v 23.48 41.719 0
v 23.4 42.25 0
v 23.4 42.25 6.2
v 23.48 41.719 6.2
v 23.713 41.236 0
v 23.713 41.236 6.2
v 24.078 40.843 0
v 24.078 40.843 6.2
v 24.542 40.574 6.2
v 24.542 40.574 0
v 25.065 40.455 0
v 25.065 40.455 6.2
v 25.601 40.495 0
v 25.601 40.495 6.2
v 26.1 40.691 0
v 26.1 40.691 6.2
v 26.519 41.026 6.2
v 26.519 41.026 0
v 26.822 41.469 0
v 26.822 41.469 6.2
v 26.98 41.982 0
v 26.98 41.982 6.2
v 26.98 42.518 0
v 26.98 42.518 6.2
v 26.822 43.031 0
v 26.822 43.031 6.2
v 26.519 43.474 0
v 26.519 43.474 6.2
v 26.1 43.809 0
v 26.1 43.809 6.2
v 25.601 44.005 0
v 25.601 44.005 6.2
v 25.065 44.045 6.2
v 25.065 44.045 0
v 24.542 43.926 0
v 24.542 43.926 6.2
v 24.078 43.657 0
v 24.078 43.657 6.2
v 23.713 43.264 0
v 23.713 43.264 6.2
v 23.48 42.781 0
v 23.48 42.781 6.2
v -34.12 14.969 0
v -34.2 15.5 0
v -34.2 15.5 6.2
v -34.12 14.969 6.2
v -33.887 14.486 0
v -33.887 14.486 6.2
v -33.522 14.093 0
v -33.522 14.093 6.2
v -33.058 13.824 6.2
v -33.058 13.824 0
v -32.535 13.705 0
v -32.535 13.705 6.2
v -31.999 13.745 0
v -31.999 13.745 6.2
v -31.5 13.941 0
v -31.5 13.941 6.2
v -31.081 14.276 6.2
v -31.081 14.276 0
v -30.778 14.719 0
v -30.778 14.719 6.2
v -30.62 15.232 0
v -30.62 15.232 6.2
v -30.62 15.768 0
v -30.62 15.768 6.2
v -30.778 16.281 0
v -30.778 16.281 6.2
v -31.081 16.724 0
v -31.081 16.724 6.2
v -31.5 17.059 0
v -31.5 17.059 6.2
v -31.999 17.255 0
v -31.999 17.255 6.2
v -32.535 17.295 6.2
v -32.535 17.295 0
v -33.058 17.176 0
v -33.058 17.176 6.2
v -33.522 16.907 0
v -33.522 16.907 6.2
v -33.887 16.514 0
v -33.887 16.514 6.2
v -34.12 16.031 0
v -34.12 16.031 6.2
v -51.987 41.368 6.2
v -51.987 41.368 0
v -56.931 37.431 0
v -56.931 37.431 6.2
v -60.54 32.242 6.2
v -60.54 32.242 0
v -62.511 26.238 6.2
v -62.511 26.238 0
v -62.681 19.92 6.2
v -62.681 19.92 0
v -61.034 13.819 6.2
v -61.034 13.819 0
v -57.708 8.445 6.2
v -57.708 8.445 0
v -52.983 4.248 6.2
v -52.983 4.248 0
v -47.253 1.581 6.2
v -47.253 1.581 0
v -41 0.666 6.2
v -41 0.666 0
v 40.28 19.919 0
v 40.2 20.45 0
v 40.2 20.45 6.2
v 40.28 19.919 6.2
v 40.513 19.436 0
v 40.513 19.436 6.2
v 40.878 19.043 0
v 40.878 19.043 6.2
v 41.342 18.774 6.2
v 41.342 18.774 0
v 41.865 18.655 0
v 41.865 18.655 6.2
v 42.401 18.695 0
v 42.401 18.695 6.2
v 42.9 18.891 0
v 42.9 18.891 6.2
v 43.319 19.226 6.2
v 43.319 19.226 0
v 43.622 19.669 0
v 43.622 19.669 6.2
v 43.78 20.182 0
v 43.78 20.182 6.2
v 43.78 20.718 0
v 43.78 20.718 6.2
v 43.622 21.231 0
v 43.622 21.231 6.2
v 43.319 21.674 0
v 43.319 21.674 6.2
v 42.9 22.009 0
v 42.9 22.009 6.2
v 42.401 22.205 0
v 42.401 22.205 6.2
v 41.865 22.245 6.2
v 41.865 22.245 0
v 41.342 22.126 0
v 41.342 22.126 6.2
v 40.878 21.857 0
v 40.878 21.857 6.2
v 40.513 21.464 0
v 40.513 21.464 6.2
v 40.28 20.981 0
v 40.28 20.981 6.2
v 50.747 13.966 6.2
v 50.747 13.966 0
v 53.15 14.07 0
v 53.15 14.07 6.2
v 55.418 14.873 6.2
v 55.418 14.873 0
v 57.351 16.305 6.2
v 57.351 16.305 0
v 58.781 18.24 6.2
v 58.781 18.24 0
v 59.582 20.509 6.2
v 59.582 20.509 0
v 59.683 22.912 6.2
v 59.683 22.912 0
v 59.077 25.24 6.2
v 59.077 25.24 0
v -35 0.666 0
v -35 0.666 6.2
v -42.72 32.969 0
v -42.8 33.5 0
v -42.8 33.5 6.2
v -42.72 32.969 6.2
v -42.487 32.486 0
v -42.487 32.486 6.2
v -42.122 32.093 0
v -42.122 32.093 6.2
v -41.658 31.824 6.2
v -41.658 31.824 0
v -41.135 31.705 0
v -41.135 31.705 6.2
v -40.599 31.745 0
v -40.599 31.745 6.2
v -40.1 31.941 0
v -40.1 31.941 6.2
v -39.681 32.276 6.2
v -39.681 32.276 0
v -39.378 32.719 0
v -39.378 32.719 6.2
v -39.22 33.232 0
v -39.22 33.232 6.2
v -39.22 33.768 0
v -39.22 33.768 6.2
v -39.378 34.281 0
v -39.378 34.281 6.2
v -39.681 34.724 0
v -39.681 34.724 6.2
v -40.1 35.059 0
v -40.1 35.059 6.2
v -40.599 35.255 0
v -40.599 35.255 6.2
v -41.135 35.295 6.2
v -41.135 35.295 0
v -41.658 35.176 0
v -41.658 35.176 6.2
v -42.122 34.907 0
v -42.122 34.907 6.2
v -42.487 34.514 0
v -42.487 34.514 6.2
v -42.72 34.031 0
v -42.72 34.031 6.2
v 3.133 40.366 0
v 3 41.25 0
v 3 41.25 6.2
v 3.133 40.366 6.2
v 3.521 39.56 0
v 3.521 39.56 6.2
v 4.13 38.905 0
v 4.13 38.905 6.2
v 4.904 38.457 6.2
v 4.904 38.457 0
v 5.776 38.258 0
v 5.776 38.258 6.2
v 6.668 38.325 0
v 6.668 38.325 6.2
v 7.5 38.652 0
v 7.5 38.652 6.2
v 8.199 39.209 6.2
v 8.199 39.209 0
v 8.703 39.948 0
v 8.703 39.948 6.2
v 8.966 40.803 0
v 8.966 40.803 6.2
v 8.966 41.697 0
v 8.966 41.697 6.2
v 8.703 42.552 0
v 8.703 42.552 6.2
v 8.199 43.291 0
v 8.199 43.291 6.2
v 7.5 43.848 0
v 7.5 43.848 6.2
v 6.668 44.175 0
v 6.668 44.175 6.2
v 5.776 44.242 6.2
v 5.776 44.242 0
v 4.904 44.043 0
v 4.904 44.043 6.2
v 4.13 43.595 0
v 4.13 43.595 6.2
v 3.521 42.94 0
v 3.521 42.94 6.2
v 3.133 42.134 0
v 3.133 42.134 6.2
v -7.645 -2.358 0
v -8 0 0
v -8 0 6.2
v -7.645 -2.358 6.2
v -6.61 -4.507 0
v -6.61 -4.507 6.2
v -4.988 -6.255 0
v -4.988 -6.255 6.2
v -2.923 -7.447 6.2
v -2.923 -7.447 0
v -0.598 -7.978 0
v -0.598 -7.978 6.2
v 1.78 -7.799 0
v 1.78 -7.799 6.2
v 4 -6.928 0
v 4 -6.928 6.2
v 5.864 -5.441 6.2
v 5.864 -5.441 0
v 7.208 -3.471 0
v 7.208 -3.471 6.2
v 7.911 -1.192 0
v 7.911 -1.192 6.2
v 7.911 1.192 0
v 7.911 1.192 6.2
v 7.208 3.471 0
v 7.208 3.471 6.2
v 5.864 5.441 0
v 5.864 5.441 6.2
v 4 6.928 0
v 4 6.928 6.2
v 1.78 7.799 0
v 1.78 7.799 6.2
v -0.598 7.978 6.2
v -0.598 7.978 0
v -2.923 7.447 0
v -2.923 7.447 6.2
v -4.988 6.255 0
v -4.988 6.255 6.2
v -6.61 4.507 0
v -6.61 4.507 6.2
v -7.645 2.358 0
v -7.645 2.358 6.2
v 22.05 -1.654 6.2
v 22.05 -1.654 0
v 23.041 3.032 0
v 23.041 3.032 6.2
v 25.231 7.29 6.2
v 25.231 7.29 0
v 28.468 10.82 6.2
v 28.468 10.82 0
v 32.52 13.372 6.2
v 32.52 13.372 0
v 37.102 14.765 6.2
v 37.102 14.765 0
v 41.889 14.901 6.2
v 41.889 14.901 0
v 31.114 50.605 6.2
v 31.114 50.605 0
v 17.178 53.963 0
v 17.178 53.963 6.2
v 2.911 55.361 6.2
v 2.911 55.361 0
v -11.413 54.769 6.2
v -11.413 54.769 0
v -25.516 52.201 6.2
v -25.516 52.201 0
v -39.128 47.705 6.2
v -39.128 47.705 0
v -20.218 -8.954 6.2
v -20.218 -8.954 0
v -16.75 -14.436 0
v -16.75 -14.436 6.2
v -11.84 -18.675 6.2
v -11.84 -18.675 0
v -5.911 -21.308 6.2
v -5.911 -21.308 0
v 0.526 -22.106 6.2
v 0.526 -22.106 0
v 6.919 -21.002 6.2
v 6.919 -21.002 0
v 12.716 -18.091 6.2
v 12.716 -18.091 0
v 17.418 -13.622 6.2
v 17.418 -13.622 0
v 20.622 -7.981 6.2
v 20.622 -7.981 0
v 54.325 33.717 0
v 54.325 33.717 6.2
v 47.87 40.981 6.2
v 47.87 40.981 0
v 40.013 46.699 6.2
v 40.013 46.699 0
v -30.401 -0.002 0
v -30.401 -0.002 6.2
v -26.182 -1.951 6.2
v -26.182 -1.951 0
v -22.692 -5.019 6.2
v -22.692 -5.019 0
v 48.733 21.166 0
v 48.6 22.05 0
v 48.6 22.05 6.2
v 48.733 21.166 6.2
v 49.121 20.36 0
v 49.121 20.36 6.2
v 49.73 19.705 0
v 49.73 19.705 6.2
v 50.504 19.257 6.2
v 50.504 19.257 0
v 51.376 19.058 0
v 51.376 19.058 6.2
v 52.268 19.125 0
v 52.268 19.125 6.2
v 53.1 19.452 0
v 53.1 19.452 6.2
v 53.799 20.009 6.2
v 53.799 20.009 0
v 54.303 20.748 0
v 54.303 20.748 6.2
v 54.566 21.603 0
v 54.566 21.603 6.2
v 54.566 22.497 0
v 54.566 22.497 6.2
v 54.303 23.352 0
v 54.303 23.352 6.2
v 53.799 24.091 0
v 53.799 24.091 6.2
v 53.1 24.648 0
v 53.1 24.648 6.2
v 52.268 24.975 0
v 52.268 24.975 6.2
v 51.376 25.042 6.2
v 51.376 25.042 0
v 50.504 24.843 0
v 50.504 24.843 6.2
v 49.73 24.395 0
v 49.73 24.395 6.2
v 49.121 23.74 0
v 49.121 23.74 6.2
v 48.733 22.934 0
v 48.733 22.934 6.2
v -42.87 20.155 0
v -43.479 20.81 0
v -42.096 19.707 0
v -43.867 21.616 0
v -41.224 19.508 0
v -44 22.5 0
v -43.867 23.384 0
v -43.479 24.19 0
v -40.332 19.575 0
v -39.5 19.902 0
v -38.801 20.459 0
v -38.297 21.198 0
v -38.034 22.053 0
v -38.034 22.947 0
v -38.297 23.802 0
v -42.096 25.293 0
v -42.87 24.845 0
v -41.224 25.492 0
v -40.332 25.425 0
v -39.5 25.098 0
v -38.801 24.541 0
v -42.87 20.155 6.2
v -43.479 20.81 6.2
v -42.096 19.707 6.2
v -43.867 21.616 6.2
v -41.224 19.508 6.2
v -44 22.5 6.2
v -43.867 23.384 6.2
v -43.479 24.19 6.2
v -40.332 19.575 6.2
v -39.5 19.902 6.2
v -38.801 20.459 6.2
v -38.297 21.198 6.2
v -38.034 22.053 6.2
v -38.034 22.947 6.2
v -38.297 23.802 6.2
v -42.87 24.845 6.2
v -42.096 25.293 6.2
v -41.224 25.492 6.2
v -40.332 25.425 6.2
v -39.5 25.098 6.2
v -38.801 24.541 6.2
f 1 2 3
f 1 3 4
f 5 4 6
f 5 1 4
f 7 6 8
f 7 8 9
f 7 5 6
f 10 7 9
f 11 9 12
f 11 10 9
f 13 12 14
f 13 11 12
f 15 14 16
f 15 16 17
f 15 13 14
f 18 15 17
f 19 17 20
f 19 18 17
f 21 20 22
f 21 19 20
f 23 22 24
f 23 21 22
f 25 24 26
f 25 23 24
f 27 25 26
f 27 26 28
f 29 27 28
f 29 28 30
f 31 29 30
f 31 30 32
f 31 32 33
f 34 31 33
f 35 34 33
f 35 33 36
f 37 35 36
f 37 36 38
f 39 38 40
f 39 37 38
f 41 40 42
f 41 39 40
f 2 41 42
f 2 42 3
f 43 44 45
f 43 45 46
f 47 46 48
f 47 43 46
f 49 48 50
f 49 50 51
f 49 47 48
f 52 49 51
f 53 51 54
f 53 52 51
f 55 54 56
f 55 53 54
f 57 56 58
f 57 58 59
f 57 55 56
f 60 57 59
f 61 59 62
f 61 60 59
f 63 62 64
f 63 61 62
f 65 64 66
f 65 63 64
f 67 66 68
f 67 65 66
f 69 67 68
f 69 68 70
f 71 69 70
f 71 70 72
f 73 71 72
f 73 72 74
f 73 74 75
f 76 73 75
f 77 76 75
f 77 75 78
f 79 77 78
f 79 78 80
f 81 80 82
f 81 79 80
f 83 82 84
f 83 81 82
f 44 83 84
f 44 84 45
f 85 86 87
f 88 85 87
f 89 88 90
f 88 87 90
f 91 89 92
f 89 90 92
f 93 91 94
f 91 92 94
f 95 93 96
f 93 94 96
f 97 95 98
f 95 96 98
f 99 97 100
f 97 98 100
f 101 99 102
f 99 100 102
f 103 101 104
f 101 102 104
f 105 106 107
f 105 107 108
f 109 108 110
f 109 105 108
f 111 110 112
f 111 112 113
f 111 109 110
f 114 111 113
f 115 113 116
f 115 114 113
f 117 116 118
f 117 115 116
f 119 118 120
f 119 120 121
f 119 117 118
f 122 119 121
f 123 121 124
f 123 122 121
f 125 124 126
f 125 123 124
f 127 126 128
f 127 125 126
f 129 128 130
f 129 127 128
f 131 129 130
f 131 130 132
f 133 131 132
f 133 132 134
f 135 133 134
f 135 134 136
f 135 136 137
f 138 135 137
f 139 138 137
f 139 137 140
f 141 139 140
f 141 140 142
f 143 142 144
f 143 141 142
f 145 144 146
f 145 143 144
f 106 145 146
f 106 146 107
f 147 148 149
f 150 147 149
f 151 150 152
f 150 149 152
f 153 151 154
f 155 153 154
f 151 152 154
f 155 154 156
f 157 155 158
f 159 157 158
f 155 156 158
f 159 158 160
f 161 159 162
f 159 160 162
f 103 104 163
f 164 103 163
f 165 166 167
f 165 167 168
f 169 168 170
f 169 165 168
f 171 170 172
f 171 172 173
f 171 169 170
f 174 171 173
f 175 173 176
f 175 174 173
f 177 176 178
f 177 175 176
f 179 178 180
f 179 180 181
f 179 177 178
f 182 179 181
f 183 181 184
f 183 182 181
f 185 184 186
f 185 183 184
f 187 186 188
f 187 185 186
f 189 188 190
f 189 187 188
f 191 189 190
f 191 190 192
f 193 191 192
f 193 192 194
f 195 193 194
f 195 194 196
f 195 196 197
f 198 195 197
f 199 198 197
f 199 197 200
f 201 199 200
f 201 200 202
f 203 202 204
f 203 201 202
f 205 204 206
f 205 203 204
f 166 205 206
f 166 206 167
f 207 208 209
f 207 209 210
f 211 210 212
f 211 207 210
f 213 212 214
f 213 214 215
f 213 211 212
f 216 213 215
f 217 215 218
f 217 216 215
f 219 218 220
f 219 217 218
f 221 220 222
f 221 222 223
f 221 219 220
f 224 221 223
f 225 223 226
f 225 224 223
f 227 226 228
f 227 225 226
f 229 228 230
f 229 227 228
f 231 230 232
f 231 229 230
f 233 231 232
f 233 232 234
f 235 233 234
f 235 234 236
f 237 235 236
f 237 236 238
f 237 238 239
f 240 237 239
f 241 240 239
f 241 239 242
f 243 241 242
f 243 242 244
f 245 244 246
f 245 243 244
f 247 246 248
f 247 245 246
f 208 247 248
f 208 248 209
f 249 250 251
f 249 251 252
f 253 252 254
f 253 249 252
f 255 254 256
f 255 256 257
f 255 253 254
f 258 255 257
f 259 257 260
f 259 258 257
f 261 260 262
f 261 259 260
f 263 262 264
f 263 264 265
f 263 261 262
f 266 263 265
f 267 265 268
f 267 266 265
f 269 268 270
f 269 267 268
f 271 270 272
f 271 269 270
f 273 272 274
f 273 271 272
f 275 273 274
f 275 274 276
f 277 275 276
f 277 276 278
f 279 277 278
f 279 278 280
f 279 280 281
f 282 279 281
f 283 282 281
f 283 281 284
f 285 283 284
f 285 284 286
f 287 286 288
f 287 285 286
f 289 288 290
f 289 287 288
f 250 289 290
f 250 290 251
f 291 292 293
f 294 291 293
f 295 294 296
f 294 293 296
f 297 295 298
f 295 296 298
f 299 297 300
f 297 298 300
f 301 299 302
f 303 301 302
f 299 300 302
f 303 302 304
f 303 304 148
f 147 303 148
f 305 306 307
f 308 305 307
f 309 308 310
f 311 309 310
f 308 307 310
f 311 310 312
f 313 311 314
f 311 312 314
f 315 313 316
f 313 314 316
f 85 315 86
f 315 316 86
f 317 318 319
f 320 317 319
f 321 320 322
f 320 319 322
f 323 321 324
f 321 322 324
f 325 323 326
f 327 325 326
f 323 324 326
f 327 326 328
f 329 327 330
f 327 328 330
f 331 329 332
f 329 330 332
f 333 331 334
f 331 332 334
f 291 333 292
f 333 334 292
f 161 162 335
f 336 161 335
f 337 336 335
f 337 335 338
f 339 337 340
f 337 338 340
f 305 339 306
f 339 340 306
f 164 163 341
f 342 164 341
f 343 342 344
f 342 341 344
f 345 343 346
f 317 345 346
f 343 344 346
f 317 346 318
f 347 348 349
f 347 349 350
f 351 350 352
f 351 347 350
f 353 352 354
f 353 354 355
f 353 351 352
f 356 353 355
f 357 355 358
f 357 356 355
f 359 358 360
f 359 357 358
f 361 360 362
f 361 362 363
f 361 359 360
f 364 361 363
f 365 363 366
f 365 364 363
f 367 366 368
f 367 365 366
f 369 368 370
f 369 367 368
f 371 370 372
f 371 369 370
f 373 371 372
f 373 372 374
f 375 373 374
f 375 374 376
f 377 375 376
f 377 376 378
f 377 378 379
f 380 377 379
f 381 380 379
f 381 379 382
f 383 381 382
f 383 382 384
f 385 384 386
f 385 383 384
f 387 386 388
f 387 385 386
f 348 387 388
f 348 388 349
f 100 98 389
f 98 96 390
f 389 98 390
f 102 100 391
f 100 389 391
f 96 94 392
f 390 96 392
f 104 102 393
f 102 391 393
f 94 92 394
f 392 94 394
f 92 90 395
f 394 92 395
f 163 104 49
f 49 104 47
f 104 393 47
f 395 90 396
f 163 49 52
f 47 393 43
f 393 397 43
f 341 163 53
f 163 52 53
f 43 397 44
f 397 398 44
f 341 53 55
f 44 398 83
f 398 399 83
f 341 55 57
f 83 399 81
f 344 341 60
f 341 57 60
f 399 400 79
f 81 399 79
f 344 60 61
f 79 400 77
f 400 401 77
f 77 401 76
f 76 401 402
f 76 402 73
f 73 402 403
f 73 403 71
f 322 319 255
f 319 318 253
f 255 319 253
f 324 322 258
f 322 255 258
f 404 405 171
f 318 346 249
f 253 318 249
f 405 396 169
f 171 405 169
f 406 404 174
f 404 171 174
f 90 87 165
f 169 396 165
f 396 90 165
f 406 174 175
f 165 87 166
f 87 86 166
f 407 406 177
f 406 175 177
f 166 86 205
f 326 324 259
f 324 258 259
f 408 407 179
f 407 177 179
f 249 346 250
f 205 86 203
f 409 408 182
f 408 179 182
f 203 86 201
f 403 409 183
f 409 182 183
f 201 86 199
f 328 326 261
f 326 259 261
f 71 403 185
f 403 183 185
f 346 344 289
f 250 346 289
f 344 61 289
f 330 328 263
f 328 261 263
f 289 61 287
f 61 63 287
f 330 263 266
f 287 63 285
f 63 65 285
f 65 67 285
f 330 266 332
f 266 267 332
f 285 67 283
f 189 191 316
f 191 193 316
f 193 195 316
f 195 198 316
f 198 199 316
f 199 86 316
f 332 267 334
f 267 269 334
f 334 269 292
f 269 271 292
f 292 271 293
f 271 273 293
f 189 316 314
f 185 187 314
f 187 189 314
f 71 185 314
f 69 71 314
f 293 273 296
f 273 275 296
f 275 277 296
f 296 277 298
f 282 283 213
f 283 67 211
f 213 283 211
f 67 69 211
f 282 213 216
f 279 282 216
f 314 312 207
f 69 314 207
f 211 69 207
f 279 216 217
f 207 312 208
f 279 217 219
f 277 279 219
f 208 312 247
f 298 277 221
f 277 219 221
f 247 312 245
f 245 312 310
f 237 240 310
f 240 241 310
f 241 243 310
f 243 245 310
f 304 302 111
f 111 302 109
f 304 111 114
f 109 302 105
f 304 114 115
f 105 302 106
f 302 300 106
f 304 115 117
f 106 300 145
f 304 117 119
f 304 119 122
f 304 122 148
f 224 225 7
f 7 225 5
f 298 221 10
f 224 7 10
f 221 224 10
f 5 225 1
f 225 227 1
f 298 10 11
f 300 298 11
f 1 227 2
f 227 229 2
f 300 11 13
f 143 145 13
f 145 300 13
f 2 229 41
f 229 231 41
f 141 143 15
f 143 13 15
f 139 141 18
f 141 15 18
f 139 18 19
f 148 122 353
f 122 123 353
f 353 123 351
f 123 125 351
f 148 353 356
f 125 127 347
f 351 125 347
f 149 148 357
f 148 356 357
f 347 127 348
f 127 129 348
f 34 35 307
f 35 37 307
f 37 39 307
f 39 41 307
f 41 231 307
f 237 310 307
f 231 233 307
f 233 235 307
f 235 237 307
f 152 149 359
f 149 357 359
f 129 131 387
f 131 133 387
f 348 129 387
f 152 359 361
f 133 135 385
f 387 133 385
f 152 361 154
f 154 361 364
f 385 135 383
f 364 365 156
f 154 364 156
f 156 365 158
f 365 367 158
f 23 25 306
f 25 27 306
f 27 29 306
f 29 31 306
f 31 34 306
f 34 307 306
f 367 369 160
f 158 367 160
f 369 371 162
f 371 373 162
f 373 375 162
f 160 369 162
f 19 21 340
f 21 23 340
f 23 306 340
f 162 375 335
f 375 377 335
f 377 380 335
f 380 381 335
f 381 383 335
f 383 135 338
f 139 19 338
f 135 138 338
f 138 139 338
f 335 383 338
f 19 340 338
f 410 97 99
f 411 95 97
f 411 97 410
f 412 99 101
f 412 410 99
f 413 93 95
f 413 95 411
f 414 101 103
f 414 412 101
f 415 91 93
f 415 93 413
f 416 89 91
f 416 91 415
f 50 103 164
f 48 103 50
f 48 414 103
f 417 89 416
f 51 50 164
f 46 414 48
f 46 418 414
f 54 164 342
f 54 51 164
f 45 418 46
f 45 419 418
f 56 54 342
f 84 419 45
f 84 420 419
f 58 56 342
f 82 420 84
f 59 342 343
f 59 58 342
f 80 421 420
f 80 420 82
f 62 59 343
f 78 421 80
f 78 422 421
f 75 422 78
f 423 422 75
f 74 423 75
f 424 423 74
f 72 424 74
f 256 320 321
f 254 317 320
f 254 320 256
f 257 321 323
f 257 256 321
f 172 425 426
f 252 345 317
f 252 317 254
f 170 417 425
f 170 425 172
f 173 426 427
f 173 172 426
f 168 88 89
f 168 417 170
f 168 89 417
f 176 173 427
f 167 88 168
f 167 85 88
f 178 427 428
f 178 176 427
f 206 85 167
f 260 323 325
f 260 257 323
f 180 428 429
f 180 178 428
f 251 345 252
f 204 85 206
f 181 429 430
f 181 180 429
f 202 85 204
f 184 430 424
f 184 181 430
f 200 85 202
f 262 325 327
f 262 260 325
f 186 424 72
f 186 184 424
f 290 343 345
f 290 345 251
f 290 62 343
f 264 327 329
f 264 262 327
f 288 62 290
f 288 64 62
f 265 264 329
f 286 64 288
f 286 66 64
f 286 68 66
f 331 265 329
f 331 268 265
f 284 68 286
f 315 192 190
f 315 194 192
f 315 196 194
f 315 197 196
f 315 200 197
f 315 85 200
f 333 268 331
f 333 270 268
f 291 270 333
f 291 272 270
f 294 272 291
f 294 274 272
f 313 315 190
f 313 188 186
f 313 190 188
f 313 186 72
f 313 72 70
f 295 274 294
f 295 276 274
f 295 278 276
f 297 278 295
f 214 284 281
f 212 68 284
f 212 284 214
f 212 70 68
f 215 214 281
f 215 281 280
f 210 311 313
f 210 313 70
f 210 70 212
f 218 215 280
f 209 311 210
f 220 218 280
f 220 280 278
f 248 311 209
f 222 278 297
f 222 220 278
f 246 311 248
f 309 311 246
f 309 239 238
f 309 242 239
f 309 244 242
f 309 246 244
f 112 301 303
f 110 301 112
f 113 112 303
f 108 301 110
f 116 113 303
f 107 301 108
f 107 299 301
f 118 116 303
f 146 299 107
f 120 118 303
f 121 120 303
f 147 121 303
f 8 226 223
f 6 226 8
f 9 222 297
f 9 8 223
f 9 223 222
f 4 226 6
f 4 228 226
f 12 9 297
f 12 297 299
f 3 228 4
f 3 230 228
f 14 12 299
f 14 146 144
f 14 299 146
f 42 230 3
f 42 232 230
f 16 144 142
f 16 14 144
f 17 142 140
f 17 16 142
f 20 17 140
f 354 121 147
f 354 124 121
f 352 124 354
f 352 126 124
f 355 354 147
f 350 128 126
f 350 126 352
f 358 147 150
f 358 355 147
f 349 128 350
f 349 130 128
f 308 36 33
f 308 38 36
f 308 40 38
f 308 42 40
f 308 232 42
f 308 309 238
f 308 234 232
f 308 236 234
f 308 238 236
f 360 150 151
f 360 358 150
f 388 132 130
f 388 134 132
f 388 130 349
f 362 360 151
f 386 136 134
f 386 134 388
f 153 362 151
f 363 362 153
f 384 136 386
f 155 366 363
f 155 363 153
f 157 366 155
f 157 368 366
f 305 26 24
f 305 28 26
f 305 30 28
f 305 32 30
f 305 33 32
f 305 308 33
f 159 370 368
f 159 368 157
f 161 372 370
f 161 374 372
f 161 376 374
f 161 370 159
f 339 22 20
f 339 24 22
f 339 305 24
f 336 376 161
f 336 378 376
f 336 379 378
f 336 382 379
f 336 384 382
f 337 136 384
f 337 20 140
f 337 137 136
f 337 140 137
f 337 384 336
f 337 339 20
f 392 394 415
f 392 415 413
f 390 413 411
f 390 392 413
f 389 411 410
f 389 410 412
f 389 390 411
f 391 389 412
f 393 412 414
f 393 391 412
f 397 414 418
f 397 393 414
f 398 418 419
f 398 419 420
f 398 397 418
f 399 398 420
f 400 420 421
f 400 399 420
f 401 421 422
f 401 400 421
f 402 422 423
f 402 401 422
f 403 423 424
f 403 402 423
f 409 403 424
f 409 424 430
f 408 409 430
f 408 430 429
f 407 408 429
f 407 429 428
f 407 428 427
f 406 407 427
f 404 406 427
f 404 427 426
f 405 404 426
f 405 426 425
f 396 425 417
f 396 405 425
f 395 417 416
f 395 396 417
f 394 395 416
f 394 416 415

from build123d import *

# Parameters (mm, degrees)
SKETCH1_R           = 3
SKETCH1_R_2         = 8
SKETCH1_R_3         = 1.8
BOSS_EXTRUDE1_DEPTH = 6.2


with BuildPart() as part:
    # Sketch1 → Boss-Extrude1 (new body)
    with BuildSketch(Plane.XY):
        with BuildLine():
            Line((41.889296616, 14.900574245), (50.746753734, 13.965723579))
            ThreePointArc((50.746753734, 13.965723579), (58.138171033, 17.219277376), (59.076989694, 25.240329771))
            ThreePointArc((59.076989694, 25.240329771), (47.870351378, 40.981444556), (31.114327774, 50.604703359))
            ThreePointArc((31.114327774, 50.604703359), (-11.412690469, 54.769217303), (-51.987221097, 41.367802402))
            ThreePointArc((-51.987221097, 41.367802402), (-62.079231834, 16.80974691), (-41, 0.666241851))
            Line((-41, 0.666241851), (-35, 0.666241851))
            ThreePointArc((-35, 0.666241851), (-26.181808949, -1.950576316), (-20.218406631, -8.953865794))
            ThreePointArc((-20.218406631, -8.953865794), (3.76322615, -21.789763842), (22.050412422, -1.653780932))
            ThreePointArc((22.050412422, -1.653780932), (28.467658292, 10.820459281), (41.889296616, 14.900574245))
        make_face()
        with Locations(Location((-41, 22.5, 0), (0, 0, 180))):
            Circle(SKETCH1_R, mode=Mode.SUBTRACT)
        with Locations(Location((6, 41.25, 0), (0, 0, 180))):
            Circle(SKETCH1_R, mode=Mode.SUBTRACT)
        with Locations(Location((51.6, 22.050001086, 0), (0, 0, 180))):
            Circle(SKETCH1_R, mode=Mode.SUBTRACT)
        with Locations(Location((0, 0, 0), (0, 0, 180))):
            Circle(SKETCH1_R_2, mode=Mode.SUBTRACT)
        with Locations(Location((25.2, 42.25, 0), (0, 0, 180))):
            Circle(SKETCH1_R_3, mode=Mode.SUBTRACT)
        with Locations(Location((-32.4, 15.5, 0), (0, 0, 180))):
            Circle(SKETCH1_R_3, mode=Mode.SUBTRACT)
        with Locations(Location((42, 20.450001086, 0), (0, 0, 180))):
            Circle(SKETCH1_R_3, mode=Mode.SUBTRACT)
        with Locations(Location((-41, 33.5, 0), (0, 0, 180))):
            Circle(SKETCH1_R_3, mode=Mode.SUBTRACT)
    extrude(amount=BOSS_EXTRUDE1_DEPTH)


solid = part.part
